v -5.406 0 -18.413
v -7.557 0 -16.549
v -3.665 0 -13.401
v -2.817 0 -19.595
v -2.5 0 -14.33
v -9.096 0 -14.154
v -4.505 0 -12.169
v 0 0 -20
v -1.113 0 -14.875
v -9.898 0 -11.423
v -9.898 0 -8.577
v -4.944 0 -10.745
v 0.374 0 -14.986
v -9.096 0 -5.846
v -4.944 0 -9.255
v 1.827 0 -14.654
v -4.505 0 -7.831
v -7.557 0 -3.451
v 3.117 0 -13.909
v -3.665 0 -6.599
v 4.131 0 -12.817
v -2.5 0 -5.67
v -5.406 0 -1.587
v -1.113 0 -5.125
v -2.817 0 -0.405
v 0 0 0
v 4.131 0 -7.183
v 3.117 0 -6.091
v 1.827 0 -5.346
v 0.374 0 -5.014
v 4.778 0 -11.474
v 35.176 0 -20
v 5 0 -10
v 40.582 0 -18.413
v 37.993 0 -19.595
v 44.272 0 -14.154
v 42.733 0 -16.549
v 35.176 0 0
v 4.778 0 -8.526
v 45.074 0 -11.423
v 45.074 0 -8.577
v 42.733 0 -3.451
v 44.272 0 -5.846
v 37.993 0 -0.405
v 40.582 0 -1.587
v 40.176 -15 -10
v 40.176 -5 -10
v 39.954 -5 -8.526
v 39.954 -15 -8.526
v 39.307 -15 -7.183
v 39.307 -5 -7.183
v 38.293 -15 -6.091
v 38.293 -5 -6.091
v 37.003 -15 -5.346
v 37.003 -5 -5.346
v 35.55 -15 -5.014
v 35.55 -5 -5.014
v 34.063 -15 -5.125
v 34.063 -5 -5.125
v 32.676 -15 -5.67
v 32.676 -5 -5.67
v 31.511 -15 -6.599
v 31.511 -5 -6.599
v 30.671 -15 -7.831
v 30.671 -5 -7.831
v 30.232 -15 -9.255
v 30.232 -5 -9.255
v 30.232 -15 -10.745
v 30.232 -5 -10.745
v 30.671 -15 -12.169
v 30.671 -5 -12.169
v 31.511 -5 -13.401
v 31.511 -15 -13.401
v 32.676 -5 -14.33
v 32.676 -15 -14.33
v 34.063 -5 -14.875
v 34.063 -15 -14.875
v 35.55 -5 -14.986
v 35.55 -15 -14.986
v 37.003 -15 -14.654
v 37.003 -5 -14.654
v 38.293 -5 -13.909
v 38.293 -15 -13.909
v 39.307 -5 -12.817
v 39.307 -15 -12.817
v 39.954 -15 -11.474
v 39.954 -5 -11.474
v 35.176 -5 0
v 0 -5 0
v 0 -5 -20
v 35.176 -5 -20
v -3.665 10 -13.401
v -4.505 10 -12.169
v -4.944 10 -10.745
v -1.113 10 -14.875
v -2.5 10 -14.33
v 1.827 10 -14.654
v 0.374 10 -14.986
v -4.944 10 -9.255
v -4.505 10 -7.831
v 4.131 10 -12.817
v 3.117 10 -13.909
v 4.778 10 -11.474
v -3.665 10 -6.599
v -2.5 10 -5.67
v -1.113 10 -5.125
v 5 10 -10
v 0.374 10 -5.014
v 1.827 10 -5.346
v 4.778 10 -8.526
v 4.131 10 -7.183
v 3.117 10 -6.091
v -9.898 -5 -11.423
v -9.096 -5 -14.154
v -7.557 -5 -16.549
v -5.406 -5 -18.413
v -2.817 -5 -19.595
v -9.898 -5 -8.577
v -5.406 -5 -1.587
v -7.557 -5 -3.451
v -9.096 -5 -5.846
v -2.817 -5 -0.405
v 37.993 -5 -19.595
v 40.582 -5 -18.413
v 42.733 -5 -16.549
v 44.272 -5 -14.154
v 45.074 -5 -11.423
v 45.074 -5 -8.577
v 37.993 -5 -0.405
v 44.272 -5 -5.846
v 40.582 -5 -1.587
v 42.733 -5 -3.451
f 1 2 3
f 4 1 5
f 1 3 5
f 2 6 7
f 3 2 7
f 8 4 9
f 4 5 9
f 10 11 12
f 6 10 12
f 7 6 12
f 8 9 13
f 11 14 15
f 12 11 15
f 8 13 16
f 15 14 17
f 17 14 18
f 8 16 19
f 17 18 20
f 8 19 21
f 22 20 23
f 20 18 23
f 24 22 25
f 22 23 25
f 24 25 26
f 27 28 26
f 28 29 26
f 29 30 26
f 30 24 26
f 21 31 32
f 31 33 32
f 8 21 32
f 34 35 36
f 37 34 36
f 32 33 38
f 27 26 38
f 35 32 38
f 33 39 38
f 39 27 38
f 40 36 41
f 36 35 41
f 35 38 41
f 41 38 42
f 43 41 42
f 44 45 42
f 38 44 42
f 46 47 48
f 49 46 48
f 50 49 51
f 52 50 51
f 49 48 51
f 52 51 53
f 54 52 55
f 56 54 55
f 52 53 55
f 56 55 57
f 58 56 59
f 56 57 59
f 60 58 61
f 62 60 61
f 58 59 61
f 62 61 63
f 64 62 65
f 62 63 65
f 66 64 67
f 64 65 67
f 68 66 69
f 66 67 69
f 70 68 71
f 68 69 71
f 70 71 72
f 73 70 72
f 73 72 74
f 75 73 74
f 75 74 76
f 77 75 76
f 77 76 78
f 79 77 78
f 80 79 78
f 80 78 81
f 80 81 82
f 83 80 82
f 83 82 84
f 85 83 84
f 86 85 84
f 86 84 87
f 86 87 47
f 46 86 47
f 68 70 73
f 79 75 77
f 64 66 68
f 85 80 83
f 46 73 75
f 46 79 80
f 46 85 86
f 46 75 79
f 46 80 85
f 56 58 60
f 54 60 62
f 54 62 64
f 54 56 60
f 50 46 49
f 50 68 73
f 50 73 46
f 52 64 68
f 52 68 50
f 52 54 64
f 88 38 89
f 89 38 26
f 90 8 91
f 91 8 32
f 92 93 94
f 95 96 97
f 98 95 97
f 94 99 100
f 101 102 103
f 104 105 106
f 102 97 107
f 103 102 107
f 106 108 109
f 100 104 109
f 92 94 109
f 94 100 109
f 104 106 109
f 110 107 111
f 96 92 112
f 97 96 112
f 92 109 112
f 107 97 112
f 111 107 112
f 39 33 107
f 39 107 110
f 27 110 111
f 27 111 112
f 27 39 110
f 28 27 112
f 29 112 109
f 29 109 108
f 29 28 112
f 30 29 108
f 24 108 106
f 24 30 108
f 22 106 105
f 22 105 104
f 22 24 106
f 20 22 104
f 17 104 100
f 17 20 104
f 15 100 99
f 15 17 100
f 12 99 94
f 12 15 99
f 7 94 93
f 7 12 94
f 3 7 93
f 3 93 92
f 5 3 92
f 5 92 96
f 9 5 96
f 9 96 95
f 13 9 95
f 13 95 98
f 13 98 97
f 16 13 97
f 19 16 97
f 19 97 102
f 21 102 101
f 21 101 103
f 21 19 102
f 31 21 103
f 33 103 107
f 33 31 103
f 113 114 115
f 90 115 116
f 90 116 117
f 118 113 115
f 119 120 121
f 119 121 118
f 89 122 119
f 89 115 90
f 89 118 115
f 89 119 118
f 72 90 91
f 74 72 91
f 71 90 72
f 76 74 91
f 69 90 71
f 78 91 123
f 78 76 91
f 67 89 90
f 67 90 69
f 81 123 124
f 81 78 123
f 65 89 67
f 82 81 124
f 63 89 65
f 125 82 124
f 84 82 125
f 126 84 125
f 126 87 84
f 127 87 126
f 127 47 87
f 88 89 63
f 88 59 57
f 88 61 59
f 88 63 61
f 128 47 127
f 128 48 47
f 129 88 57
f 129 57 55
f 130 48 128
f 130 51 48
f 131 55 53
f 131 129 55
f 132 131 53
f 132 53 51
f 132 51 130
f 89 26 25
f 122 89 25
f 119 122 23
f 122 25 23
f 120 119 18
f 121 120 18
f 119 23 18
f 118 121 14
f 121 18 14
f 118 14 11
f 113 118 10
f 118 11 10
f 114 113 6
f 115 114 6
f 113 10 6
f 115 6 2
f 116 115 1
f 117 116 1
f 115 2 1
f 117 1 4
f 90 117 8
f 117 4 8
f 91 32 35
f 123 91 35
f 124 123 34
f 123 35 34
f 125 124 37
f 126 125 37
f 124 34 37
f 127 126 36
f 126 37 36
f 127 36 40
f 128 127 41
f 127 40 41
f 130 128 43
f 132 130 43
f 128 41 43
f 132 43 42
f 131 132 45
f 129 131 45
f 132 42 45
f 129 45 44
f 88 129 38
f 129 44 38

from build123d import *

# Parameters (mm, degrees)
F0_R          = 5
F1_DEPTH      = 5
F2_DEPTH      = 15
F3_DEPTH      = 10
F3_DEPTH_BACK = 5


with BuildPart() as f1:
    # F0 (on Front) → F1 (new body)
    with BuildSketch(Plane.XZ):
        with BuildLine():
            Line((35.1758819227, 0), (0, 0))
            ThreePointArc((0, 0), (-10, -10), (0, -20))
            Line((0, -20), (35.1758819227, -20))
            ThreePointArc((35.1758819227, -20), (45.1758819227, -10), (35.1758819227, 0))
        make_face()
        with Locations((0, -10)):
            Circle(F0_R, mode=Mode.SUBTRACT)
        with Locations((35.1758819227, -10)):
            Circle(F0_R, mode=Mode.SUBTRACT)
    extrude(amount=F1_DEPTH)

    # F0 (on Front) → F2 (join)
    with BuildSketch(Plane.XZ):
        with Locations((35.1758819227, -10)):
            Circle(F0_R)
    extrude(amount=F2_DEPTH)

    # F0 (on Front) → F3 (join, two sides)
    with BuildSketch(Plane.XZ) as f3_sk:
        with Locations((0, -10)):
            Circle(F0_R)
    extrude(amount=-F3_DEPTH)
    extrude(f3_sk.sketch, amount=F3_DEPTH_BACK)


solid = f1.part
